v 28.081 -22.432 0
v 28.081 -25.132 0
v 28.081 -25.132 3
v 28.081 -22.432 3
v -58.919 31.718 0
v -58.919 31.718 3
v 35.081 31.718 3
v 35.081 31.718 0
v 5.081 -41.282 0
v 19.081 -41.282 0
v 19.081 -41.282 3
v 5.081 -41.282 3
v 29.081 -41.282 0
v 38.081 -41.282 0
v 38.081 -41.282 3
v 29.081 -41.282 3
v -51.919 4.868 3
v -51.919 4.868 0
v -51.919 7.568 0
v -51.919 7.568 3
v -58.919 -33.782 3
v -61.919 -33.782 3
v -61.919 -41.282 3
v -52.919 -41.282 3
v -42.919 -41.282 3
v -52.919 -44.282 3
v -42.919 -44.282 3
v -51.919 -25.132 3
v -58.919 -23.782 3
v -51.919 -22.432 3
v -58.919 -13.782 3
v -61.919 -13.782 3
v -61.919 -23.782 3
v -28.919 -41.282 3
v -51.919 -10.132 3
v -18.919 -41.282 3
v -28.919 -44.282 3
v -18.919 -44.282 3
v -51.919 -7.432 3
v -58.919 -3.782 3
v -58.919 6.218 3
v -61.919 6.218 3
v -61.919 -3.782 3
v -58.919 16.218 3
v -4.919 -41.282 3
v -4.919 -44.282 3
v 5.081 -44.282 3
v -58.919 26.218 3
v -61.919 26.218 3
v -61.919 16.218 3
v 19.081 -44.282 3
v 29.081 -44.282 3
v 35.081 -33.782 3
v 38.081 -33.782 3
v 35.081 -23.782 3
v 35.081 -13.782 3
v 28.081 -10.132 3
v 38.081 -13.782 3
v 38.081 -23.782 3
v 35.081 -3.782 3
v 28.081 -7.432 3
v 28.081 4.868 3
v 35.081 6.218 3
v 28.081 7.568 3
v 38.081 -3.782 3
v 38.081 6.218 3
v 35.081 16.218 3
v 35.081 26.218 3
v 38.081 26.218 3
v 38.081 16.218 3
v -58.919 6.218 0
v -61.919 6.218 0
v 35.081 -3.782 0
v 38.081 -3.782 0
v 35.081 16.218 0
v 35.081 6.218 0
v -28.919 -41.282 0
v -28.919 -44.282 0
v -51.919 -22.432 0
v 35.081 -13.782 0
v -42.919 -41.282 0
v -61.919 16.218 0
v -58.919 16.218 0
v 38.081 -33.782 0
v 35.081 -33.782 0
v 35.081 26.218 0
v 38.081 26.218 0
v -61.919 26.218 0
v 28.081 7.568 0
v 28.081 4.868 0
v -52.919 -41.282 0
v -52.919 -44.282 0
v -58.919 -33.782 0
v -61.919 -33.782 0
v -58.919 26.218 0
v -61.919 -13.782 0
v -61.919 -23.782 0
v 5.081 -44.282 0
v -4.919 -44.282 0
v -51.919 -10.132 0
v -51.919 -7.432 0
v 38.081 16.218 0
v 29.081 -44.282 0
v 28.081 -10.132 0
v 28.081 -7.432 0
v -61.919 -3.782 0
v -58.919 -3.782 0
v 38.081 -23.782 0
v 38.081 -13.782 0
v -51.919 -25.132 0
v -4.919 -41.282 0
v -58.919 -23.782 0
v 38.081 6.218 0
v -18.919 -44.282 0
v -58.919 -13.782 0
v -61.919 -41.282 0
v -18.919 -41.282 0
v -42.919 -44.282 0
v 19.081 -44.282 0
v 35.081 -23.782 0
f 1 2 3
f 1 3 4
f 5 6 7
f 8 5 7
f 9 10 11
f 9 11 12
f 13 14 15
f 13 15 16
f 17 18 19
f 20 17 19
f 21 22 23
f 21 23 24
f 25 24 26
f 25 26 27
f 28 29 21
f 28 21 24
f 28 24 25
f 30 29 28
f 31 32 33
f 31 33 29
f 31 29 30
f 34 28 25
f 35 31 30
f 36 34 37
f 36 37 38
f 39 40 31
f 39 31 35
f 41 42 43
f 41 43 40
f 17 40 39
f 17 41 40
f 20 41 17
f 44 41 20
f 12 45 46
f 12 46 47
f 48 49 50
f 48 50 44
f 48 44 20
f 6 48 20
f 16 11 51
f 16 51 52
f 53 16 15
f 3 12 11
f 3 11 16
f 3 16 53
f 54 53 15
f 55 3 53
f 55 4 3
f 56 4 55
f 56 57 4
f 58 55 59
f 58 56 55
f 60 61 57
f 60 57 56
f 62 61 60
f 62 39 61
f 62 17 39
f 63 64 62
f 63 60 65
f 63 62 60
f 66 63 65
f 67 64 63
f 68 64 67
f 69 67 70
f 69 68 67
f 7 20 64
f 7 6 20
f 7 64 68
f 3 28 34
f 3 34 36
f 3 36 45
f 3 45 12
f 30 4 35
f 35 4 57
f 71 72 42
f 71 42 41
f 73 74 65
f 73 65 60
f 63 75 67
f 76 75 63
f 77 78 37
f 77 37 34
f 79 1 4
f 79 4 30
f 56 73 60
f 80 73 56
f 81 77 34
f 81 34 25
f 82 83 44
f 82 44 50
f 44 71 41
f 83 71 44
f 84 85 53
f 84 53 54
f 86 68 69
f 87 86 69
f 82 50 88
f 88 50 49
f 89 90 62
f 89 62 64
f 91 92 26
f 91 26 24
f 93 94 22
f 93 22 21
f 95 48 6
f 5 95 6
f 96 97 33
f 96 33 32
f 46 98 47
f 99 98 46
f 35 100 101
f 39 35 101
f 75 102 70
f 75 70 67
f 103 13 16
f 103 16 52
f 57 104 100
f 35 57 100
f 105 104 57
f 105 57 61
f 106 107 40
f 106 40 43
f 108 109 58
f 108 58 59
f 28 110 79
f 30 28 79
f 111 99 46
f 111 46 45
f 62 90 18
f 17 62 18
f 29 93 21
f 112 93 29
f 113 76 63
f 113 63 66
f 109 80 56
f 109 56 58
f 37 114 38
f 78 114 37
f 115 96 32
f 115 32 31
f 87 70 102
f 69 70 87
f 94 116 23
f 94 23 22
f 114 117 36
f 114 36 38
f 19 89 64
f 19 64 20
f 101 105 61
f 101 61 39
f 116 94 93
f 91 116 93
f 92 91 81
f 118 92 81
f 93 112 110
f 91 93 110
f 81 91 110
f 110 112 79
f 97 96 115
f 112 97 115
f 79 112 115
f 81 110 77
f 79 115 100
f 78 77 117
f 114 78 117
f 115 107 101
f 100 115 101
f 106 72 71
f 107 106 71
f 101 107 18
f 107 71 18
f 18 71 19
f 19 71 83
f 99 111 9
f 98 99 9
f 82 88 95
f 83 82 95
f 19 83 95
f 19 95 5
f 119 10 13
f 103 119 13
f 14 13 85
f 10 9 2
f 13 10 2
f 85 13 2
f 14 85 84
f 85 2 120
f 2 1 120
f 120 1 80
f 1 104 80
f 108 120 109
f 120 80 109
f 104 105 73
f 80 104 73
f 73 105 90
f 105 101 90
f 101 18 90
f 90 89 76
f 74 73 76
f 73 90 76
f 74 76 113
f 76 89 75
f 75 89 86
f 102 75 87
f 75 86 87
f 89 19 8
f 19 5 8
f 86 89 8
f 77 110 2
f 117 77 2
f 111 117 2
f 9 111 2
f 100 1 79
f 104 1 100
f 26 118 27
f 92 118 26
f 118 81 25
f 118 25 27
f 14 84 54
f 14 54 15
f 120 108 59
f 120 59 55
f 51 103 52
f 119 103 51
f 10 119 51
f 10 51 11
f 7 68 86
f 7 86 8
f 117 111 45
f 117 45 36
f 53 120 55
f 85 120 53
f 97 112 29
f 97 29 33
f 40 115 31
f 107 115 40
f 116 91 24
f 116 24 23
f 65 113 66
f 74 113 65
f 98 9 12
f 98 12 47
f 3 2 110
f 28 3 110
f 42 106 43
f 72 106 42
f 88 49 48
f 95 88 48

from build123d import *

# Parameters (mm, degrees)
EXTRUDE_1_DEPTH     = 3
SKETCH_2_W          = 80
SKETCH_2_H          = 2.7
CUT_EXTRUDE_1_DEPTH = 3
SKETCH_3_W          = 100
SKETCH_3_H          = 8
EXTRUDE_3_DEPTH     = 3
SKETCH_4_W          = 3
SKETCH_4_H          = 5.5
CUT_EXTRUDE_2_DEPTH = 3


with BuildPart() as part:
    # 草圖1 → 填料-伸長1 (new body)
    with BuildSketch(Plane.XY):
        Polygon((-61.919288793, 23.718072979), (-52.919288793, 23.718072979), (-52.919288793, 26.718072979), (-42.919288793, 26.718072979), (-42.919288793, 23.718072979), (-28.919288793, 23.718072979), (-28.919288793, 26.718072979), (-18.919288793, 26.718072979), (-18.919288793, 23.718072979), (-4.919288793, 23.718072979), (-4.919288793, 26.718072979), (5.080711207, 26.718072979), (5.080711207, 23.718072979), (19.080711207, 23.718072979), (19.080711207, 26.718072979), (29.080711207, 26.718072979), (29.080711207, 23.718072979), (38.080711207, 23.718072979), (38.080711207, 16.218072979), (35.080711207, 16.218072979), (35.080711207, 6.218072979), (38.080711207, 6.218072979), (38.080711207, -3.781927021), (35.080711207, -3.781927021), (35.080711207, -13.781927021), (38.080711207, -13.781927021), (38.080711207, -23.781927021), (35.080711207, -23.781927021), (35.080711207, -33.781927021), (38.080711207, -33.781927021), (38.080711207, -41.281927021), (29.080711207, -41.281927021), (29.080711207, -44.281927021), (19.080711207, -44.281927021), (19.080711207, -41.281927021), (5.080711207, -41.281927021), (5.080711207, -44.281927021), (-4.919288793, -44.281927021), (-4.919288793, -41.281927021), (-18.919288793, -41.281927021), (-18.919288793, -44.281927021), (-28.919288793, -44.281927021), (-28.919288793, -41.281927021), (-42.919288793, -41.281927021), (-42.919288793, -44.281927021), (-52.919288793, -44.281927021), (-52.919288793, -41.281927021), (-61.919288793, -41.281927021), (-61.919288793, -33.781927021), (-58.919288793, -33.781927021), (-58.919288793, -23.781927021), (-61.919288793, -23.781927021), (-61.919288793, -13.781927021), (-58.919288793, -13.781927021), (-58.919288793, -3.781927021), (-61.919288793, -3.781927021), (-61.919288793, 6.218072979), (-58.919288793, 6.218072979), (-58.919288793, 16.218072979), (-61.919288793, 16.218072979), align=None)
    extrude(amount=EXTRUDE_1_DEPTH)

    # 草圖2 → 除料-伸長1 (cut)
    with BuildSketch(Plane(origin=(0, 0, 0), x_dir=(-1, 0, 0), z_dir=(0, 0, -1))):
        with Locations((11.919288793, -8.781927021)):
            Rectangle(SKETCH_2_W, SKETCH_2_H)
        with Locations((11.919288793, 6.218072979)):
            Rectangle(SKETCH_2_W, SKETCH_2_H)
        with Locations((11.919288793, -23.781927021)):
            Rectangle(SKETCH_2_W, SKETCH_2_H)
    extrude(amount=-CUT_EXTRUDE_1_DEPTH, mode=Mode.SUBTRACT)

    # 草圖3 → 填料-伸長3 (add)
    with BuildSketch(Plane.XY.offset(3)):
        with Locations((-11.919288793, 27.718072979)):
            Rectangle(SKETCH_3_W, SKETCH_3_H)
    extrude(amount=-EXTRUDE_3_DEPTH)

    # 草圖4 → 除料-伸長2 (cut)
    with BuildSketch(Plane.XY.offset(3)):
        with Locations((36.580711207, 28.968072979)):
            Rectangle(SKETCH_4_W, SKETCH_4_H)
        with Locations((-60.419288793, 28.968072979)):
            Rectangle(SKETCH_4_W, SKETCH_4_H)
    extrude(amount=-CUT_EXTRUDE_2_DEPTH, mode=Mode.SUBTRACT)


solid = part.part
